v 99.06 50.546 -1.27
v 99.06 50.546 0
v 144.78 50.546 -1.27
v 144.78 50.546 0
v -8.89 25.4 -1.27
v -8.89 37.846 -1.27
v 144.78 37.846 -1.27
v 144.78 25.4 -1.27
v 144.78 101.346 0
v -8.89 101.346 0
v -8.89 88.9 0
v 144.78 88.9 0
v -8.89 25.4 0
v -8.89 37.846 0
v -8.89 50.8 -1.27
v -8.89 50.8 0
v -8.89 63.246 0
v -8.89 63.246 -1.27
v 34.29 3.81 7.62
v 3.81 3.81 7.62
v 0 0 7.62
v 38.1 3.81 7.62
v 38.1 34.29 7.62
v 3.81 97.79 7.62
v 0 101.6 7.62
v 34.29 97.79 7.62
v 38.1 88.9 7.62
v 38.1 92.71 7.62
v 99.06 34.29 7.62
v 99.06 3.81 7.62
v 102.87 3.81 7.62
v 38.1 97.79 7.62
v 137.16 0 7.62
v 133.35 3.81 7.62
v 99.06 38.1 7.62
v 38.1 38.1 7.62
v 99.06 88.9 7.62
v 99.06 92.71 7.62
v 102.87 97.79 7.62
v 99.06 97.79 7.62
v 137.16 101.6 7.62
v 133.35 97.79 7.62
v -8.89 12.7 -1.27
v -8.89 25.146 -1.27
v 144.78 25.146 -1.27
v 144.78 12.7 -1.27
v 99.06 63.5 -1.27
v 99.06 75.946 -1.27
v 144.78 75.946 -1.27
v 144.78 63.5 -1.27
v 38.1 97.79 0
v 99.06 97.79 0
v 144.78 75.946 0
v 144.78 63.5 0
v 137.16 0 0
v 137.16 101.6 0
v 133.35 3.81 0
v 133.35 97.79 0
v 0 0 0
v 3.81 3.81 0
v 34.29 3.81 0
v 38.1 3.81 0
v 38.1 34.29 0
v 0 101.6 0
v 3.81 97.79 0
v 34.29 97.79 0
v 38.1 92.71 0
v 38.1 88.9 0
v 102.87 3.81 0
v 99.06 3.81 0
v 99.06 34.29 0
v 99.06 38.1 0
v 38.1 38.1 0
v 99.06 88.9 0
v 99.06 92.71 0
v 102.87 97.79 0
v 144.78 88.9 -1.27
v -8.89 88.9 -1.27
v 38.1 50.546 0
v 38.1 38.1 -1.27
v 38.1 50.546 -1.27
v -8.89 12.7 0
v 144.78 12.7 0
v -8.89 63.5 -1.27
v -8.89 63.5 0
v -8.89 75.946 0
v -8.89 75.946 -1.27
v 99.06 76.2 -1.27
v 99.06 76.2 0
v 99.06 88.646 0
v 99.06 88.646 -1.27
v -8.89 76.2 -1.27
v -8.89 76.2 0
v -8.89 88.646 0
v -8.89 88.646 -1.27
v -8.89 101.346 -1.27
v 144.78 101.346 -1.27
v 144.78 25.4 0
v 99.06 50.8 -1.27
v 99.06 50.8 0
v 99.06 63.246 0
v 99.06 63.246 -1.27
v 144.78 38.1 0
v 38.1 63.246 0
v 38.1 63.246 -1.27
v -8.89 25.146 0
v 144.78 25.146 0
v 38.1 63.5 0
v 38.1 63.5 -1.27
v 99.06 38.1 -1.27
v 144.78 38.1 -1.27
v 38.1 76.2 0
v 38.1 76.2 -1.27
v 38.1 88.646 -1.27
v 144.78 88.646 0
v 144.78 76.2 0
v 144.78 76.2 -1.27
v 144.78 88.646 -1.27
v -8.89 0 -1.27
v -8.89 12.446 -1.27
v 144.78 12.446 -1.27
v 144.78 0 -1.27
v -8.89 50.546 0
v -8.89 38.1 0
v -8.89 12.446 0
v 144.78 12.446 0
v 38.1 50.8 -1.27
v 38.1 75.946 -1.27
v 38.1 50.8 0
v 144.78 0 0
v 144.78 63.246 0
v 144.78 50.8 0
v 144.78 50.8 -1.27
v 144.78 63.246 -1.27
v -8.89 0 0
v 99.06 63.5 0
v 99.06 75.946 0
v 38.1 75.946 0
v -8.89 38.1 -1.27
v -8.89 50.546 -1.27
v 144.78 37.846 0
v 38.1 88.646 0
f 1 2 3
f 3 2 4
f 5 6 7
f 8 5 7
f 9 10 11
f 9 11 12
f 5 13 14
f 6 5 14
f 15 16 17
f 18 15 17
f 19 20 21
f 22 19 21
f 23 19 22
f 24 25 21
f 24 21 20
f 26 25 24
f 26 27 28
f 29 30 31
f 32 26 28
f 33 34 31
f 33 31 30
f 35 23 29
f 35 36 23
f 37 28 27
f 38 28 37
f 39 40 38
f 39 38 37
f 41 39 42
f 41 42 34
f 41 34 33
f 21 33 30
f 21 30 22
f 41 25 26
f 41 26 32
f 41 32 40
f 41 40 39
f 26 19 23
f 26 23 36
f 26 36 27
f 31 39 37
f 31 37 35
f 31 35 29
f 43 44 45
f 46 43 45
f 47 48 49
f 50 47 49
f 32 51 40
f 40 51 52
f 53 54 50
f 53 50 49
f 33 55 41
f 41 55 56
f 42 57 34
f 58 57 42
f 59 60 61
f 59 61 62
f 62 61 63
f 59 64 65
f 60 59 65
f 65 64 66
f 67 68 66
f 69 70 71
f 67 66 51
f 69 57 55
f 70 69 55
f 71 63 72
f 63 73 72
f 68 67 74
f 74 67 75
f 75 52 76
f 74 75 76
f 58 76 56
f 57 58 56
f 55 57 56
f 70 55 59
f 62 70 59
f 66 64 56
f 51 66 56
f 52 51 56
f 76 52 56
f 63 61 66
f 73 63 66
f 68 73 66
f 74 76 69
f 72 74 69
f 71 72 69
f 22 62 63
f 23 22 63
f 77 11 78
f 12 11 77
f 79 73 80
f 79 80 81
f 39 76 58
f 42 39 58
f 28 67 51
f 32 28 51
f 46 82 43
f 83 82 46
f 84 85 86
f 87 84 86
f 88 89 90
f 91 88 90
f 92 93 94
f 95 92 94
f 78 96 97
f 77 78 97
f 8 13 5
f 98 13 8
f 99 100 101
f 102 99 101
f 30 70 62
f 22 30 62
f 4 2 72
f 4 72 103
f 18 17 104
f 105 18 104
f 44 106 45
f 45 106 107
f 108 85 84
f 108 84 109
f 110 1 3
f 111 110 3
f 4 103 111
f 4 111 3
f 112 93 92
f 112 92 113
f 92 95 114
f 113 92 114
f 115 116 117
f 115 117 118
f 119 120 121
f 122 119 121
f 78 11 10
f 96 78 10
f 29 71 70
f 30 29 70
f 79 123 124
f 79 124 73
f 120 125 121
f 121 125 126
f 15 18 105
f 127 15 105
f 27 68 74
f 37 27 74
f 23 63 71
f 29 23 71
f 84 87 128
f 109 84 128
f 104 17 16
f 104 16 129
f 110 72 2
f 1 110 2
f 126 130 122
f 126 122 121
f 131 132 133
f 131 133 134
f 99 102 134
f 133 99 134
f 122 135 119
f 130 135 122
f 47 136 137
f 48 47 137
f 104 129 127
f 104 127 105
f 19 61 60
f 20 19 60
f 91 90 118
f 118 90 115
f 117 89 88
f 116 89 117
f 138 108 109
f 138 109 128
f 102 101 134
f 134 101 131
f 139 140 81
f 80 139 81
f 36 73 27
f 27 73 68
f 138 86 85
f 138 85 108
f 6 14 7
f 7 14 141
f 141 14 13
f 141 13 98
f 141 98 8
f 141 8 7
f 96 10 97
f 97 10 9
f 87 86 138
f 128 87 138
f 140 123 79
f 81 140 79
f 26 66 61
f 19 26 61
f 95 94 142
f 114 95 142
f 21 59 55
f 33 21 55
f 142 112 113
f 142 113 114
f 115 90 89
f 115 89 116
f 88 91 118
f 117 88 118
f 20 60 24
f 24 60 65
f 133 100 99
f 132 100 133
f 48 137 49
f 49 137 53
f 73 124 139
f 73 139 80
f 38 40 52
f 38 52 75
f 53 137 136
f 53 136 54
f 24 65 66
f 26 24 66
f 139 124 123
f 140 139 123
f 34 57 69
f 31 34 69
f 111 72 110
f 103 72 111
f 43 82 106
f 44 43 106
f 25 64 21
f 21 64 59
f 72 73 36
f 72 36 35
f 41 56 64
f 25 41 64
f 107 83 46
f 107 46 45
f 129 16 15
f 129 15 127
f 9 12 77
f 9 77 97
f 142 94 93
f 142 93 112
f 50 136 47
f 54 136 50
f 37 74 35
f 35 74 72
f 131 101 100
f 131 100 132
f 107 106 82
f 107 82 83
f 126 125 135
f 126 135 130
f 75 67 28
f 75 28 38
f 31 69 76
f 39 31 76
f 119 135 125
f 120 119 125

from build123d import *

# Parameters (mm, degrees)
F0_W     = 60.96
F0_H     = 3.81
F0_W_2   = 3.81
F0_H_2   = 93.98
F1_DEPTH = 7.62
F2_W     = 153.67
F2_H     = 12.446
F3_DEPTH = 1.27
F0_H_3   = 50.8
F4_DEPTH = 25.4


with BuildPart() as f1:
    # F0 (on Top) → F1 (new body)
    with BuildSketch(Plane.XY):
        Polygon((0, 101.6), (0, 97.79), (3.81, 97.79), (34.29, 97.79), (38.1, 97.79), (99.06, 97.79), (102.87, 97.79), (133.35, 97.79), (137.16, 97.79), (137.16, 101.6), align=None)
        Polygon((34.29, 97.79), (34.29, 3.81), (38.1, 3.81), (38.1, 34.29), (38.1, 38.1), (38.1, 88.9), (38.1, 92.71), (38.1, 97.79), align=None)
        with Locations((68.58, 90.805)):
            Rectangle(F0_W, F0_H)
        Polygon((99.06, 3.81), (102.87, 3.81), (102.87, 97.79), (99.06, 97.79), (99.06, 92.71), (99.06, 88.9), (99.06, 38.1), (99.06, 34.29), align=None)
        with Locations((135.255, 50.8)):
            Rectangle(F0_W_2, F0_H_2)
        with Locations((68.58, 36.195)):
            Rectangle(F0_W, F0_H)
        with Locations((1.905, 50.8)):
            Rectangle(F0_W_2, F0_H_2)
        Polygon((0, 3.81), (0, 0), (137.16, 0), (137.16, 3.81), (133.35, 3.81), (102.87, 3.81), (99.06, 3.81), (38.1, 3.81), (34.29, 3.81), (3.81, 3.81), align=None)
    extrude(amount=F1_DEPTH)


with BuildPart() as f3:
    # F2 (on Top) → F3 (new body)
    with BuildSketch(Plane.XY):
        with Locations((67.945, 6.223)):
            Rectangle(F2_W, F2_H)
        with Locations((67.945, 18.923)):
            Rectangle(F2_W, F2_H)
        with Locations((67.945, 31.623)):
            Rectangle(F2_W, F2_H)
        with Locations((67.945, 44.323)):
            Rectangle(F2_W, F2_H)
        with Locations((67.945, 57.023)):
            Rectangle(F2_W, F2_H)
        with Locations((67.945, 69.723)):
            Rectangle(F2_W, F2_H)
        with Locations((67.945, 82.423)):
            Rectangle(F2_W, F2_H)
        with Locations((67.945, 95.123)):
            Rectangle(F2_W, F2_H)
    extrude(amount=-F3_DEPTH)

    # F0 (on Top) → F4 (cut)
    with BuildSketch(Plane.XY):
        with Locations((68.58, 63.5)):
            Rectangle(F0_W, F0_H_3)
    extrude(amount=-F4_DEPTH, mode=Mode.SUBTRACT)


solid = Compound([f1.part, f3.part])
